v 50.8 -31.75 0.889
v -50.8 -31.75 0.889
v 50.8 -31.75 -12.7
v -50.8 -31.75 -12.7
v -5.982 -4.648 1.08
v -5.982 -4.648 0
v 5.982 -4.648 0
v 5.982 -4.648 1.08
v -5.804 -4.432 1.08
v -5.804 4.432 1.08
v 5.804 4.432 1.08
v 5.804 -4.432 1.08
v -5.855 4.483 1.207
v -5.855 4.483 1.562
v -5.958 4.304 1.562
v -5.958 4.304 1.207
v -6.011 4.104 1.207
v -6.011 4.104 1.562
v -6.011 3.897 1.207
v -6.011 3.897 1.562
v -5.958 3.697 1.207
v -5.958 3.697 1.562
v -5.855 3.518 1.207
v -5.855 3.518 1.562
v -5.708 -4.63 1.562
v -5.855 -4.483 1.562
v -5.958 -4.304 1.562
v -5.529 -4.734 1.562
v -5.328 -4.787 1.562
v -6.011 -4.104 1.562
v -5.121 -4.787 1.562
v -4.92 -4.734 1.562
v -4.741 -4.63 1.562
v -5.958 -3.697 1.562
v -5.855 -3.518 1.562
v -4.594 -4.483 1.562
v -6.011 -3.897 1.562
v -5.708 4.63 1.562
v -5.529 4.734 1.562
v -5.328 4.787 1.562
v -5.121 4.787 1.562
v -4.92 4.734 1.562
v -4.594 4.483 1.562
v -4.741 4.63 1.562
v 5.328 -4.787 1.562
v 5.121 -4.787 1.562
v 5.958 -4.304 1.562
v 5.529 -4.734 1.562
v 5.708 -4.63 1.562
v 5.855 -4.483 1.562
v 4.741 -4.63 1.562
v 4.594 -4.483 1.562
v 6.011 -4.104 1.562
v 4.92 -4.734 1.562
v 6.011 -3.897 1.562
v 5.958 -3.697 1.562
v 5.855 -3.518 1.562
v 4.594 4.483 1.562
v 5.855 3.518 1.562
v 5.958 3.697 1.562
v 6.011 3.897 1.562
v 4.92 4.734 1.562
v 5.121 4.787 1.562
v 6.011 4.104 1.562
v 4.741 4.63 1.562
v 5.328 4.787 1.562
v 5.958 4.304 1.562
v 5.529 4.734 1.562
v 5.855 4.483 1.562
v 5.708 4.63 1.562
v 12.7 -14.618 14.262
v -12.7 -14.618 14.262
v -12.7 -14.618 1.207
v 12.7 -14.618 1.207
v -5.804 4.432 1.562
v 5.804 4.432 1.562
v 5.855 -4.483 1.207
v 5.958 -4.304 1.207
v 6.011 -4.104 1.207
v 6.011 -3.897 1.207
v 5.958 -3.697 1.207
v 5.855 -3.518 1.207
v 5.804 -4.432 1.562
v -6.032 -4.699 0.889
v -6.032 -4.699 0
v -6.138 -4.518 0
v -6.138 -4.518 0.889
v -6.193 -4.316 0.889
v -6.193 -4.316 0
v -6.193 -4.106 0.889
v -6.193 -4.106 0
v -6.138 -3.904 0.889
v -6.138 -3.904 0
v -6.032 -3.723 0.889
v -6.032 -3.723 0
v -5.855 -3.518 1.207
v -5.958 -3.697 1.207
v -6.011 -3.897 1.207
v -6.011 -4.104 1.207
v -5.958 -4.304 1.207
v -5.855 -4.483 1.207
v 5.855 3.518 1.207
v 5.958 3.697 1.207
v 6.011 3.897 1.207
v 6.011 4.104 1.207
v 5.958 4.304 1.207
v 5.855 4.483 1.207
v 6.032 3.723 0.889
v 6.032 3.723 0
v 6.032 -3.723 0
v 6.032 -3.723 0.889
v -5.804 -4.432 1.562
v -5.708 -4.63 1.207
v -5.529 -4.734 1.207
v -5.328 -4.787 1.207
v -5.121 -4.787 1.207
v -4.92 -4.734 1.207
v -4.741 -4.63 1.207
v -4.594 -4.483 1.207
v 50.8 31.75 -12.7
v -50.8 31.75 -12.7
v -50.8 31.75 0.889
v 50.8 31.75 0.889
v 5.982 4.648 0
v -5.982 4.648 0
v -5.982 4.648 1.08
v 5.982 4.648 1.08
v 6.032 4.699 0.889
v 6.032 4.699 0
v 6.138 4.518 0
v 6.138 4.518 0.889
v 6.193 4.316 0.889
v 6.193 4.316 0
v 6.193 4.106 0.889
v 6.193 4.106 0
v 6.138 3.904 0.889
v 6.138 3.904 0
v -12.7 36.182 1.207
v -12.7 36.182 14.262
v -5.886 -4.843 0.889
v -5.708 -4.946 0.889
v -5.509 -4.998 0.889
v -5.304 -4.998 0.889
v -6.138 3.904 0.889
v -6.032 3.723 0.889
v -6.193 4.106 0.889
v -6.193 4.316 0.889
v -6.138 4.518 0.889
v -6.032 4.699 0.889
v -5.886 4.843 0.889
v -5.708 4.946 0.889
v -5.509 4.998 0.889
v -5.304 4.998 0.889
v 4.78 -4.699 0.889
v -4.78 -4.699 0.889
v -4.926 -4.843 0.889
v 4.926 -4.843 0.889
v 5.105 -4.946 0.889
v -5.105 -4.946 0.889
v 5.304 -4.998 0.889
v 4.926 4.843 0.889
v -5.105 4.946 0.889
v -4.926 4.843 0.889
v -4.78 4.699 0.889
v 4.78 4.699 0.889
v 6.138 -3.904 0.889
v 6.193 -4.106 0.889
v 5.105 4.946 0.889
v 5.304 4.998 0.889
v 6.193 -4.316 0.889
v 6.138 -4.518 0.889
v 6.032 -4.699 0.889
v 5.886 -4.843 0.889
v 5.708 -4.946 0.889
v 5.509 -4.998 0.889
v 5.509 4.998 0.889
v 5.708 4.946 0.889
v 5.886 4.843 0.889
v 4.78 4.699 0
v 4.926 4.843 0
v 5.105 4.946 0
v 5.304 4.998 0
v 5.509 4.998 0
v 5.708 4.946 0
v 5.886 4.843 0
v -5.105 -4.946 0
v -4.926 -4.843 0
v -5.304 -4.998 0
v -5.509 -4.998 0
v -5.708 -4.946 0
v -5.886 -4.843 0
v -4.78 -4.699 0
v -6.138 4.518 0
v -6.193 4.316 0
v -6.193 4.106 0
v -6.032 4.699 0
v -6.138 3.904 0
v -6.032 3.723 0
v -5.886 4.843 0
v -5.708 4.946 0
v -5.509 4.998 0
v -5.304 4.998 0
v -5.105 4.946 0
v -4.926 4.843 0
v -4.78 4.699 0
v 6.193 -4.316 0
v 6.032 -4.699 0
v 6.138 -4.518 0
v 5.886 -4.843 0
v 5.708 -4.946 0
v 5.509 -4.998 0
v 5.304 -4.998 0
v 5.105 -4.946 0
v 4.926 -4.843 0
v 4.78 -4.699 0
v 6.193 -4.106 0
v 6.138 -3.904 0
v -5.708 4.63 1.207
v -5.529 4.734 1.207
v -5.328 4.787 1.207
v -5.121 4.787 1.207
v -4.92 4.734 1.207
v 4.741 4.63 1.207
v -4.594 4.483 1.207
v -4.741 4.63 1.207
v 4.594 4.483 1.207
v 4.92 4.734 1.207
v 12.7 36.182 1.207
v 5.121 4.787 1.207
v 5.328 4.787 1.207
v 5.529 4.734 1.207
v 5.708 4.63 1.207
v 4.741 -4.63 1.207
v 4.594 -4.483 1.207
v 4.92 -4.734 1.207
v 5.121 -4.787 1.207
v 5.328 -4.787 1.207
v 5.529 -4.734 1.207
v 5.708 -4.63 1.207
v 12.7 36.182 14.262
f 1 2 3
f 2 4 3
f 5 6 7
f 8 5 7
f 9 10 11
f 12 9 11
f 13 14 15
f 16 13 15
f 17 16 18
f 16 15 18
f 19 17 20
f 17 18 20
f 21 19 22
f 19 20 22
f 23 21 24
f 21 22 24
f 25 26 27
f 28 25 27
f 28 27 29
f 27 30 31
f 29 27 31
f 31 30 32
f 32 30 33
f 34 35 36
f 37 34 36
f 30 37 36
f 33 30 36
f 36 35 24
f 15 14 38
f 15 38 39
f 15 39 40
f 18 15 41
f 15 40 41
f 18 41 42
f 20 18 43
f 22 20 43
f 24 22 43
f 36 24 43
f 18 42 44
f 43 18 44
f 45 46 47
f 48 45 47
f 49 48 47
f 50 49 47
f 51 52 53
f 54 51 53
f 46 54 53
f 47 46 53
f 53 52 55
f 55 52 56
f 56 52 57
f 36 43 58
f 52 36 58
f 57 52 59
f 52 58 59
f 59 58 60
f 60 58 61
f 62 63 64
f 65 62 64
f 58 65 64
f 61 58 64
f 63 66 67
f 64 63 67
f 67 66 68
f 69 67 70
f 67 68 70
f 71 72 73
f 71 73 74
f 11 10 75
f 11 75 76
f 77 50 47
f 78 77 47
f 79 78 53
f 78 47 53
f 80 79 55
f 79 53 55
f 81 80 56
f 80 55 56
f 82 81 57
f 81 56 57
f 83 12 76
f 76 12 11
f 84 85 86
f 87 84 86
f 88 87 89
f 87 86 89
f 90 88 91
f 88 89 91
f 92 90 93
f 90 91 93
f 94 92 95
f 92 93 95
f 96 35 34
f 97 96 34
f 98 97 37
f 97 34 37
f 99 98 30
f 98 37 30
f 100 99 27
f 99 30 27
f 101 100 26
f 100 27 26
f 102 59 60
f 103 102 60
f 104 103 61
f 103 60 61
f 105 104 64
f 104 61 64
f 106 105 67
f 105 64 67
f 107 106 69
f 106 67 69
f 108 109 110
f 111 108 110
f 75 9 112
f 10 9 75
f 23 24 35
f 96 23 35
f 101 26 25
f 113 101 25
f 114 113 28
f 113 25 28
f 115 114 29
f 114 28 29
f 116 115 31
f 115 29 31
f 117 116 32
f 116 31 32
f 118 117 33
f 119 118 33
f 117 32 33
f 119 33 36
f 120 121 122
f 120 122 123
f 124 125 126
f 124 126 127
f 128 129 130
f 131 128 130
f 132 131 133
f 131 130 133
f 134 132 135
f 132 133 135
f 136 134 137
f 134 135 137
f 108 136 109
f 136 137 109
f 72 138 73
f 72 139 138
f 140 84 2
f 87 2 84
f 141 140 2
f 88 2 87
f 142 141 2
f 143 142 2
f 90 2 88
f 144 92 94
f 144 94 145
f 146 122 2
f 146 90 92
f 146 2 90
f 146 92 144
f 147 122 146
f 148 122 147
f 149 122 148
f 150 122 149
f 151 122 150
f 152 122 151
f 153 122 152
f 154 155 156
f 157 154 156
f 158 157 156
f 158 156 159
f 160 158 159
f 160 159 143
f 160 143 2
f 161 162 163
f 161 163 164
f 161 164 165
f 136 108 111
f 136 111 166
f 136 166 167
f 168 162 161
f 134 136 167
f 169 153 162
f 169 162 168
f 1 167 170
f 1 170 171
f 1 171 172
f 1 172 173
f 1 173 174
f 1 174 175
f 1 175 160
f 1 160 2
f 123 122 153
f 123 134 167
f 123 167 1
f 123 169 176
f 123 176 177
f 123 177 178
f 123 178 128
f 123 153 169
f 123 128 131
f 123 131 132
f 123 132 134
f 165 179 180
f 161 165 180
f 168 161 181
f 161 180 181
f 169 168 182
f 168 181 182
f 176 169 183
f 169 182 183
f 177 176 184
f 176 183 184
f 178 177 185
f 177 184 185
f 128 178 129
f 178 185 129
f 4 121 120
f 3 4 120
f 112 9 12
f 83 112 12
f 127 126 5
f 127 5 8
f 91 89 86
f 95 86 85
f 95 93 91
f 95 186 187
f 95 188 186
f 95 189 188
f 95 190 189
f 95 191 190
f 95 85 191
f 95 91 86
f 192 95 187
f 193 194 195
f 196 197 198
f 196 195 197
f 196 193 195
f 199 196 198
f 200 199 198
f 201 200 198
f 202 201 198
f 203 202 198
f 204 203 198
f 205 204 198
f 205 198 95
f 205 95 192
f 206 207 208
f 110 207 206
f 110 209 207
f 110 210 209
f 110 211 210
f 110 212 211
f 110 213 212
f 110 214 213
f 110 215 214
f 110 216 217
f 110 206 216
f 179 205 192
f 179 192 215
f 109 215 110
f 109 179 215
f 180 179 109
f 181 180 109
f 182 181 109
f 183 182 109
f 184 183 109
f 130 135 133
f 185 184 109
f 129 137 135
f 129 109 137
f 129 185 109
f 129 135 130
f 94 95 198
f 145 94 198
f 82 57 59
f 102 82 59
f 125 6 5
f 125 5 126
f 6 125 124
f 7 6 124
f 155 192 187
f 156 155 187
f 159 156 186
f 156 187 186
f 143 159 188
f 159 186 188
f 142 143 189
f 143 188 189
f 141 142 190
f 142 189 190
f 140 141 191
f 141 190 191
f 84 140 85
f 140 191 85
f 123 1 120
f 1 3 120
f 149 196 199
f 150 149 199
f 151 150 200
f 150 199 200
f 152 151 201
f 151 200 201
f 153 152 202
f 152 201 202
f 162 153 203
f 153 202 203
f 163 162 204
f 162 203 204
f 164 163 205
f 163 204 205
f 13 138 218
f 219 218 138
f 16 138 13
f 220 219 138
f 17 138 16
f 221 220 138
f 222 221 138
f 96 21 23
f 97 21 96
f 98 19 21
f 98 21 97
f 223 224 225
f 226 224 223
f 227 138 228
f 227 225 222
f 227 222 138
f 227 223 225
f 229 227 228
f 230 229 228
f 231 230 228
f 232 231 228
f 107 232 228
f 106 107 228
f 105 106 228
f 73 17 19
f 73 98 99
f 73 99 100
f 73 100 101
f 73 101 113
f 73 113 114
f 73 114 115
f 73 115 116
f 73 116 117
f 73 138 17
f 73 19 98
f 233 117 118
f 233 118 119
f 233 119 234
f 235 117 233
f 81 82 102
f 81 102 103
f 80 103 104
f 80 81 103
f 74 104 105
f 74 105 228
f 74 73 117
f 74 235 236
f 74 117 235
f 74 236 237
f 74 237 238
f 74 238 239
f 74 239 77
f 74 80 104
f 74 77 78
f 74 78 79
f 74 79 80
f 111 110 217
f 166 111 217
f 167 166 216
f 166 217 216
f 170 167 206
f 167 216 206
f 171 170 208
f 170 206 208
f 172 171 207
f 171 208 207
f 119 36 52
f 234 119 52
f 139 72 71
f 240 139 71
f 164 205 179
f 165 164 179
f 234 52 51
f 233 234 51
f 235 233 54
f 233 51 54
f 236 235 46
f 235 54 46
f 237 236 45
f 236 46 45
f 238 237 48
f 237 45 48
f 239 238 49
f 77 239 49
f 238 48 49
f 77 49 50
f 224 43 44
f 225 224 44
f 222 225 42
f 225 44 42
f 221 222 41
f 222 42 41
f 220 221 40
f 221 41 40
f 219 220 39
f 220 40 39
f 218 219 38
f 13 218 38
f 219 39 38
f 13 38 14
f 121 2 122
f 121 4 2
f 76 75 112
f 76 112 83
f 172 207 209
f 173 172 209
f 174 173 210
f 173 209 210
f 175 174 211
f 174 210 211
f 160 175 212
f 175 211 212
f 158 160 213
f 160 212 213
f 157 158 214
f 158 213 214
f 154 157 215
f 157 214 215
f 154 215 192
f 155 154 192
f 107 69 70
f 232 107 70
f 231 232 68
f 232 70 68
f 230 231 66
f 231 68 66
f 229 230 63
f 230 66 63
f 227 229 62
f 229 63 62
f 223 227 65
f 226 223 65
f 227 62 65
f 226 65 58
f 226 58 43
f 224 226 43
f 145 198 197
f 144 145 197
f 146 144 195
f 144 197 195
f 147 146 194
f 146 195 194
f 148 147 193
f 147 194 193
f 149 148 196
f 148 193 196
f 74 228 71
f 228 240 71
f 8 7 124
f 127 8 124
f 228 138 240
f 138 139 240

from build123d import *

# Parameters (mm, degrees)
F0_W      = 11.9634
F0_H      = 9.2964
F1_DEPTH  = 1.0795
F2_W      = 11.6078
F2_H      = 8.8646
F3_DEPTH  = 0.4826
F4_W      = 101.6
F4_H      = 63.5
F5_DEPTH  = 12.7
F6_W      = 101.6
F6_H      = 63.5
F7_DEPTH  = 0.889
F8_W      = 25.4
F8_H      = 50.8
F8_W_2    = 11.6078
F8_H_2    = 8.8646
F9_DEPTH  = 12.7
F10_W     = 25.4
F10_H     = 50.8
F11_DEPTH = 0.3556


with BuildPart() as f1:
    # F0 (on Top) → F1 (new body)
    with BuildSketch(Plane.XY):
        Rectangle(F0_W, F0_H)
    extrude(amount=F1_DEPTH)


with BuildPart() as f3:
    # F2 (on face) → F3 (new body)
    with BuildSketch(Plane.XY.offset(1.0795)):
        Rectangle(F2_W, F2_H)
    extrude(amount=F3_DEPTH)


with BuildPart() as f5:
    # F4 (on Top) → F5 (new body)
    with BuildSketch(Plane.XY):
        Rectangle(F4_W, F4_H)
    extrude(amount=-F5_DEPTH)

    # F6 (on face) → F7 (join)
    with BuildSketch(Plane.XY):
        Rectangle(F6_W, F6_H)
        with BuildLine():
            ThreePointArc((6.0325, -3.7234568643), (6.200056771, -4.2112284321), (6.0325, -4.699))
            ThreePointArc((6.0325, -4.699), (5.406306771, -5.0049784321), (4.780113542, -4.699))
            Line((4.780113542, -4.699), (-4.780113542, -4.699))
            ThreePointArc((-4.780113542, -4.699), (-5.406306771, -5.0049784321), (-6.0325, -4.699))
            ThreePointArc((-6.0325, -4.699), (-6.200056771, -4.2112284321), (-6.0325, -3.7234568643))
            Line((-6.0325, -3.7234568643), (-6.0325, 3.7234568643))
            ThreePointArc((-6.0325, 3.7234568643), (-6.200056771, 4.2112284321), (-6.0325, 4.699))
            ThreePointArc((-6.0325, 4.699), (-5.406306771, 5.0049784321), (-4.780113542, 4.699))
            Line((-4.780113542, 4.699), (4.780113542, 4.699))
            ThreePointArc((4.780113542, 4.699), (5.406306771, 5.0049784321), (6.0325, 4.699))
            ThreePointArc((6.0325, 4.699), (6.200056771, 4.2112284321), (6.0325, 3.7234568643))
            Line((6.0325, 3.7234568643), (6.0325, -3.7234568643))
        make_face(mode=Mode.SUBTRACT)
    extrude(amount=F7_DEPTH)


with BuildPart() as f9:
    # F8 (on face) → F9 (new body)
    with BuildSketch(Plane.XY.offset(1.5621)):
        with Locations((0, 10.7823)):
            Rectangle(F8_W, F8_H)
        Rectangle(F8_W_2, F8_H_2, mode=Mode.SUBTRACT)
        Rectangle(F8_W_2, F8_H_2)
    extrude(amount=F9_DEPTH)

    # F10 (on face) → F11 (join)
    with BuildSketch(Plane(origin=(0, 0, 1.5621), x_dir=(1, 0, 0), z_dir=(0, 0, -1))):
        with Locations((0, -10.7823)):
            Rectangle(F10_W, F10_H)
        with BuildLine():
            ThreePointArc((5.8547, -3.5179612804), (6.018239023, -4.0005306402), (5.8547, -4.4831))
            ThreePointArc((5.8547, -4.4831), (5.224489023, -4.7942806402), (4.5942780461, -4.4831))
            Line((4.5942780461, -4.4831), (-4.5942780461, -4.4831))
            ThreePointArc((-4.5942780461, -4.4831), (-5.224489023, -4.7942806402), (-5.8547, -4.4831))
            ThreePointArc((-5.8547, -4.4831), (-6.018239023, -4.0005306402), (-5.8547, -3.5179612804))
            Line((-5.8547, -3.5179612804), (-5.8547, 3.5179612804))
            ThreePointArc((-5.8547, 3.5179612804), (-6.018239023, 4.0005306402), (-5.8547, 4.4831))
            ThreePointArc((-5.8547, 4.4831), (-5.224489023, 4.7942806402), (-4.5942780461, 4.4831))
            Line((-4.5942780461, 4.4831), (4.5942780461, 4.4831))
            ThreePointArc((4.5942780461, 4.4831), (5.224489023, 4.7942806402), (5.8547, 4.4831))
            ThreePointArc((5.8547, 4.4831), (6.018239023, 4.0005306402), (5.8547, 3.5179612804))
            Line((5.8547, 3.5179612804), (5.8547, -3.5179612804))
        make_face(mode=Mode.SUBTRACT)
    extrude(amount=F11_DEPTH)


solid = Compound([f1.part, f3.part, f5.part, f9.part])
